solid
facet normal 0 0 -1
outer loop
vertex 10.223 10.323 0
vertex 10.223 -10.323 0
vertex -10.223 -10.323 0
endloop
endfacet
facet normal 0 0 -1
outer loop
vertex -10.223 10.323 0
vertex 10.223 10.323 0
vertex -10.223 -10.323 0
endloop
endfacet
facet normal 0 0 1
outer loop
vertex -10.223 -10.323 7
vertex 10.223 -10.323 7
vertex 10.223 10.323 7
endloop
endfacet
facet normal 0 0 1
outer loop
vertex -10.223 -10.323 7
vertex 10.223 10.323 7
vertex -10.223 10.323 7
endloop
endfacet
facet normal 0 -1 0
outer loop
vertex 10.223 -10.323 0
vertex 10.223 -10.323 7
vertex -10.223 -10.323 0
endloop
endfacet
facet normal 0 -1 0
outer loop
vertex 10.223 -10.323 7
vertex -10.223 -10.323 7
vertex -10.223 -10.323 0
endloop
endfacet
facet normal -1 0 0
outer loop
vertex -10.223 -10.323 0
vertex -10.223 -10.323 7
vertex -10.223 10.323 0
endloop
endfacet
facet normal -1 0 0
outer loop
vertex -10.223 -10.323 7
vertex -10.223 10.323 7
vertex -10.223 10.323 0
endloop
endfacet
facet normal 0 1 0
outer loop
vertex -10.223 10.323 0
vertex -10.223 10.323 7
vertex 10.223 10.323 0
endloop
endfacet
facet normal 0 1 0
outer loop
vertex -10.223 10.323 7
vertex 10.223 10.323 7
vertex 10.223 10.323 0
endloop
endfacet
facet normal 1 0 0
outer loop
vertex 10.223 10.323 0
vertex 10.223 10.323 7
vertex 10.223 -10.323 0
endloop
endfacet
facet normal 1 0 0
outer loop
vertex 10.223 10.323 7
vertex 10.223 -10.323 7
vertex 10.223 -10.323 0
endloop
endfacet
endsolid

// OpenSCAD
// Module names are of the form poly_<inkscape-path-id>().  As a result,
// you can associate a polygon in this OpenSCAD program with the corresponding
// SVG element in the Inkscape document by looking for the XML element with
// the attribute id="inkscape-path-id".

// fudge value is used to ensure that subtracted solids are a tad taller
// in the z dimension than the polygon being subtracted from.  This helps
// keep the resulting .stl file manifold.
fudge = 0.1;

module poly_rect4600(h)
{
  scale([25.4/90, -25.4/90, 1]) union()
  {
    linear_extrude(height=h)
      polygon([[-36.221907,-36.578865],[36.221907,-36.578865],[36.221907,36.578865],[-36.221907,36.578865]]);
  }
}

module pcb_mascara2(h)
{

poly_rect4600(h);
}

pcb_mascara2(7);
